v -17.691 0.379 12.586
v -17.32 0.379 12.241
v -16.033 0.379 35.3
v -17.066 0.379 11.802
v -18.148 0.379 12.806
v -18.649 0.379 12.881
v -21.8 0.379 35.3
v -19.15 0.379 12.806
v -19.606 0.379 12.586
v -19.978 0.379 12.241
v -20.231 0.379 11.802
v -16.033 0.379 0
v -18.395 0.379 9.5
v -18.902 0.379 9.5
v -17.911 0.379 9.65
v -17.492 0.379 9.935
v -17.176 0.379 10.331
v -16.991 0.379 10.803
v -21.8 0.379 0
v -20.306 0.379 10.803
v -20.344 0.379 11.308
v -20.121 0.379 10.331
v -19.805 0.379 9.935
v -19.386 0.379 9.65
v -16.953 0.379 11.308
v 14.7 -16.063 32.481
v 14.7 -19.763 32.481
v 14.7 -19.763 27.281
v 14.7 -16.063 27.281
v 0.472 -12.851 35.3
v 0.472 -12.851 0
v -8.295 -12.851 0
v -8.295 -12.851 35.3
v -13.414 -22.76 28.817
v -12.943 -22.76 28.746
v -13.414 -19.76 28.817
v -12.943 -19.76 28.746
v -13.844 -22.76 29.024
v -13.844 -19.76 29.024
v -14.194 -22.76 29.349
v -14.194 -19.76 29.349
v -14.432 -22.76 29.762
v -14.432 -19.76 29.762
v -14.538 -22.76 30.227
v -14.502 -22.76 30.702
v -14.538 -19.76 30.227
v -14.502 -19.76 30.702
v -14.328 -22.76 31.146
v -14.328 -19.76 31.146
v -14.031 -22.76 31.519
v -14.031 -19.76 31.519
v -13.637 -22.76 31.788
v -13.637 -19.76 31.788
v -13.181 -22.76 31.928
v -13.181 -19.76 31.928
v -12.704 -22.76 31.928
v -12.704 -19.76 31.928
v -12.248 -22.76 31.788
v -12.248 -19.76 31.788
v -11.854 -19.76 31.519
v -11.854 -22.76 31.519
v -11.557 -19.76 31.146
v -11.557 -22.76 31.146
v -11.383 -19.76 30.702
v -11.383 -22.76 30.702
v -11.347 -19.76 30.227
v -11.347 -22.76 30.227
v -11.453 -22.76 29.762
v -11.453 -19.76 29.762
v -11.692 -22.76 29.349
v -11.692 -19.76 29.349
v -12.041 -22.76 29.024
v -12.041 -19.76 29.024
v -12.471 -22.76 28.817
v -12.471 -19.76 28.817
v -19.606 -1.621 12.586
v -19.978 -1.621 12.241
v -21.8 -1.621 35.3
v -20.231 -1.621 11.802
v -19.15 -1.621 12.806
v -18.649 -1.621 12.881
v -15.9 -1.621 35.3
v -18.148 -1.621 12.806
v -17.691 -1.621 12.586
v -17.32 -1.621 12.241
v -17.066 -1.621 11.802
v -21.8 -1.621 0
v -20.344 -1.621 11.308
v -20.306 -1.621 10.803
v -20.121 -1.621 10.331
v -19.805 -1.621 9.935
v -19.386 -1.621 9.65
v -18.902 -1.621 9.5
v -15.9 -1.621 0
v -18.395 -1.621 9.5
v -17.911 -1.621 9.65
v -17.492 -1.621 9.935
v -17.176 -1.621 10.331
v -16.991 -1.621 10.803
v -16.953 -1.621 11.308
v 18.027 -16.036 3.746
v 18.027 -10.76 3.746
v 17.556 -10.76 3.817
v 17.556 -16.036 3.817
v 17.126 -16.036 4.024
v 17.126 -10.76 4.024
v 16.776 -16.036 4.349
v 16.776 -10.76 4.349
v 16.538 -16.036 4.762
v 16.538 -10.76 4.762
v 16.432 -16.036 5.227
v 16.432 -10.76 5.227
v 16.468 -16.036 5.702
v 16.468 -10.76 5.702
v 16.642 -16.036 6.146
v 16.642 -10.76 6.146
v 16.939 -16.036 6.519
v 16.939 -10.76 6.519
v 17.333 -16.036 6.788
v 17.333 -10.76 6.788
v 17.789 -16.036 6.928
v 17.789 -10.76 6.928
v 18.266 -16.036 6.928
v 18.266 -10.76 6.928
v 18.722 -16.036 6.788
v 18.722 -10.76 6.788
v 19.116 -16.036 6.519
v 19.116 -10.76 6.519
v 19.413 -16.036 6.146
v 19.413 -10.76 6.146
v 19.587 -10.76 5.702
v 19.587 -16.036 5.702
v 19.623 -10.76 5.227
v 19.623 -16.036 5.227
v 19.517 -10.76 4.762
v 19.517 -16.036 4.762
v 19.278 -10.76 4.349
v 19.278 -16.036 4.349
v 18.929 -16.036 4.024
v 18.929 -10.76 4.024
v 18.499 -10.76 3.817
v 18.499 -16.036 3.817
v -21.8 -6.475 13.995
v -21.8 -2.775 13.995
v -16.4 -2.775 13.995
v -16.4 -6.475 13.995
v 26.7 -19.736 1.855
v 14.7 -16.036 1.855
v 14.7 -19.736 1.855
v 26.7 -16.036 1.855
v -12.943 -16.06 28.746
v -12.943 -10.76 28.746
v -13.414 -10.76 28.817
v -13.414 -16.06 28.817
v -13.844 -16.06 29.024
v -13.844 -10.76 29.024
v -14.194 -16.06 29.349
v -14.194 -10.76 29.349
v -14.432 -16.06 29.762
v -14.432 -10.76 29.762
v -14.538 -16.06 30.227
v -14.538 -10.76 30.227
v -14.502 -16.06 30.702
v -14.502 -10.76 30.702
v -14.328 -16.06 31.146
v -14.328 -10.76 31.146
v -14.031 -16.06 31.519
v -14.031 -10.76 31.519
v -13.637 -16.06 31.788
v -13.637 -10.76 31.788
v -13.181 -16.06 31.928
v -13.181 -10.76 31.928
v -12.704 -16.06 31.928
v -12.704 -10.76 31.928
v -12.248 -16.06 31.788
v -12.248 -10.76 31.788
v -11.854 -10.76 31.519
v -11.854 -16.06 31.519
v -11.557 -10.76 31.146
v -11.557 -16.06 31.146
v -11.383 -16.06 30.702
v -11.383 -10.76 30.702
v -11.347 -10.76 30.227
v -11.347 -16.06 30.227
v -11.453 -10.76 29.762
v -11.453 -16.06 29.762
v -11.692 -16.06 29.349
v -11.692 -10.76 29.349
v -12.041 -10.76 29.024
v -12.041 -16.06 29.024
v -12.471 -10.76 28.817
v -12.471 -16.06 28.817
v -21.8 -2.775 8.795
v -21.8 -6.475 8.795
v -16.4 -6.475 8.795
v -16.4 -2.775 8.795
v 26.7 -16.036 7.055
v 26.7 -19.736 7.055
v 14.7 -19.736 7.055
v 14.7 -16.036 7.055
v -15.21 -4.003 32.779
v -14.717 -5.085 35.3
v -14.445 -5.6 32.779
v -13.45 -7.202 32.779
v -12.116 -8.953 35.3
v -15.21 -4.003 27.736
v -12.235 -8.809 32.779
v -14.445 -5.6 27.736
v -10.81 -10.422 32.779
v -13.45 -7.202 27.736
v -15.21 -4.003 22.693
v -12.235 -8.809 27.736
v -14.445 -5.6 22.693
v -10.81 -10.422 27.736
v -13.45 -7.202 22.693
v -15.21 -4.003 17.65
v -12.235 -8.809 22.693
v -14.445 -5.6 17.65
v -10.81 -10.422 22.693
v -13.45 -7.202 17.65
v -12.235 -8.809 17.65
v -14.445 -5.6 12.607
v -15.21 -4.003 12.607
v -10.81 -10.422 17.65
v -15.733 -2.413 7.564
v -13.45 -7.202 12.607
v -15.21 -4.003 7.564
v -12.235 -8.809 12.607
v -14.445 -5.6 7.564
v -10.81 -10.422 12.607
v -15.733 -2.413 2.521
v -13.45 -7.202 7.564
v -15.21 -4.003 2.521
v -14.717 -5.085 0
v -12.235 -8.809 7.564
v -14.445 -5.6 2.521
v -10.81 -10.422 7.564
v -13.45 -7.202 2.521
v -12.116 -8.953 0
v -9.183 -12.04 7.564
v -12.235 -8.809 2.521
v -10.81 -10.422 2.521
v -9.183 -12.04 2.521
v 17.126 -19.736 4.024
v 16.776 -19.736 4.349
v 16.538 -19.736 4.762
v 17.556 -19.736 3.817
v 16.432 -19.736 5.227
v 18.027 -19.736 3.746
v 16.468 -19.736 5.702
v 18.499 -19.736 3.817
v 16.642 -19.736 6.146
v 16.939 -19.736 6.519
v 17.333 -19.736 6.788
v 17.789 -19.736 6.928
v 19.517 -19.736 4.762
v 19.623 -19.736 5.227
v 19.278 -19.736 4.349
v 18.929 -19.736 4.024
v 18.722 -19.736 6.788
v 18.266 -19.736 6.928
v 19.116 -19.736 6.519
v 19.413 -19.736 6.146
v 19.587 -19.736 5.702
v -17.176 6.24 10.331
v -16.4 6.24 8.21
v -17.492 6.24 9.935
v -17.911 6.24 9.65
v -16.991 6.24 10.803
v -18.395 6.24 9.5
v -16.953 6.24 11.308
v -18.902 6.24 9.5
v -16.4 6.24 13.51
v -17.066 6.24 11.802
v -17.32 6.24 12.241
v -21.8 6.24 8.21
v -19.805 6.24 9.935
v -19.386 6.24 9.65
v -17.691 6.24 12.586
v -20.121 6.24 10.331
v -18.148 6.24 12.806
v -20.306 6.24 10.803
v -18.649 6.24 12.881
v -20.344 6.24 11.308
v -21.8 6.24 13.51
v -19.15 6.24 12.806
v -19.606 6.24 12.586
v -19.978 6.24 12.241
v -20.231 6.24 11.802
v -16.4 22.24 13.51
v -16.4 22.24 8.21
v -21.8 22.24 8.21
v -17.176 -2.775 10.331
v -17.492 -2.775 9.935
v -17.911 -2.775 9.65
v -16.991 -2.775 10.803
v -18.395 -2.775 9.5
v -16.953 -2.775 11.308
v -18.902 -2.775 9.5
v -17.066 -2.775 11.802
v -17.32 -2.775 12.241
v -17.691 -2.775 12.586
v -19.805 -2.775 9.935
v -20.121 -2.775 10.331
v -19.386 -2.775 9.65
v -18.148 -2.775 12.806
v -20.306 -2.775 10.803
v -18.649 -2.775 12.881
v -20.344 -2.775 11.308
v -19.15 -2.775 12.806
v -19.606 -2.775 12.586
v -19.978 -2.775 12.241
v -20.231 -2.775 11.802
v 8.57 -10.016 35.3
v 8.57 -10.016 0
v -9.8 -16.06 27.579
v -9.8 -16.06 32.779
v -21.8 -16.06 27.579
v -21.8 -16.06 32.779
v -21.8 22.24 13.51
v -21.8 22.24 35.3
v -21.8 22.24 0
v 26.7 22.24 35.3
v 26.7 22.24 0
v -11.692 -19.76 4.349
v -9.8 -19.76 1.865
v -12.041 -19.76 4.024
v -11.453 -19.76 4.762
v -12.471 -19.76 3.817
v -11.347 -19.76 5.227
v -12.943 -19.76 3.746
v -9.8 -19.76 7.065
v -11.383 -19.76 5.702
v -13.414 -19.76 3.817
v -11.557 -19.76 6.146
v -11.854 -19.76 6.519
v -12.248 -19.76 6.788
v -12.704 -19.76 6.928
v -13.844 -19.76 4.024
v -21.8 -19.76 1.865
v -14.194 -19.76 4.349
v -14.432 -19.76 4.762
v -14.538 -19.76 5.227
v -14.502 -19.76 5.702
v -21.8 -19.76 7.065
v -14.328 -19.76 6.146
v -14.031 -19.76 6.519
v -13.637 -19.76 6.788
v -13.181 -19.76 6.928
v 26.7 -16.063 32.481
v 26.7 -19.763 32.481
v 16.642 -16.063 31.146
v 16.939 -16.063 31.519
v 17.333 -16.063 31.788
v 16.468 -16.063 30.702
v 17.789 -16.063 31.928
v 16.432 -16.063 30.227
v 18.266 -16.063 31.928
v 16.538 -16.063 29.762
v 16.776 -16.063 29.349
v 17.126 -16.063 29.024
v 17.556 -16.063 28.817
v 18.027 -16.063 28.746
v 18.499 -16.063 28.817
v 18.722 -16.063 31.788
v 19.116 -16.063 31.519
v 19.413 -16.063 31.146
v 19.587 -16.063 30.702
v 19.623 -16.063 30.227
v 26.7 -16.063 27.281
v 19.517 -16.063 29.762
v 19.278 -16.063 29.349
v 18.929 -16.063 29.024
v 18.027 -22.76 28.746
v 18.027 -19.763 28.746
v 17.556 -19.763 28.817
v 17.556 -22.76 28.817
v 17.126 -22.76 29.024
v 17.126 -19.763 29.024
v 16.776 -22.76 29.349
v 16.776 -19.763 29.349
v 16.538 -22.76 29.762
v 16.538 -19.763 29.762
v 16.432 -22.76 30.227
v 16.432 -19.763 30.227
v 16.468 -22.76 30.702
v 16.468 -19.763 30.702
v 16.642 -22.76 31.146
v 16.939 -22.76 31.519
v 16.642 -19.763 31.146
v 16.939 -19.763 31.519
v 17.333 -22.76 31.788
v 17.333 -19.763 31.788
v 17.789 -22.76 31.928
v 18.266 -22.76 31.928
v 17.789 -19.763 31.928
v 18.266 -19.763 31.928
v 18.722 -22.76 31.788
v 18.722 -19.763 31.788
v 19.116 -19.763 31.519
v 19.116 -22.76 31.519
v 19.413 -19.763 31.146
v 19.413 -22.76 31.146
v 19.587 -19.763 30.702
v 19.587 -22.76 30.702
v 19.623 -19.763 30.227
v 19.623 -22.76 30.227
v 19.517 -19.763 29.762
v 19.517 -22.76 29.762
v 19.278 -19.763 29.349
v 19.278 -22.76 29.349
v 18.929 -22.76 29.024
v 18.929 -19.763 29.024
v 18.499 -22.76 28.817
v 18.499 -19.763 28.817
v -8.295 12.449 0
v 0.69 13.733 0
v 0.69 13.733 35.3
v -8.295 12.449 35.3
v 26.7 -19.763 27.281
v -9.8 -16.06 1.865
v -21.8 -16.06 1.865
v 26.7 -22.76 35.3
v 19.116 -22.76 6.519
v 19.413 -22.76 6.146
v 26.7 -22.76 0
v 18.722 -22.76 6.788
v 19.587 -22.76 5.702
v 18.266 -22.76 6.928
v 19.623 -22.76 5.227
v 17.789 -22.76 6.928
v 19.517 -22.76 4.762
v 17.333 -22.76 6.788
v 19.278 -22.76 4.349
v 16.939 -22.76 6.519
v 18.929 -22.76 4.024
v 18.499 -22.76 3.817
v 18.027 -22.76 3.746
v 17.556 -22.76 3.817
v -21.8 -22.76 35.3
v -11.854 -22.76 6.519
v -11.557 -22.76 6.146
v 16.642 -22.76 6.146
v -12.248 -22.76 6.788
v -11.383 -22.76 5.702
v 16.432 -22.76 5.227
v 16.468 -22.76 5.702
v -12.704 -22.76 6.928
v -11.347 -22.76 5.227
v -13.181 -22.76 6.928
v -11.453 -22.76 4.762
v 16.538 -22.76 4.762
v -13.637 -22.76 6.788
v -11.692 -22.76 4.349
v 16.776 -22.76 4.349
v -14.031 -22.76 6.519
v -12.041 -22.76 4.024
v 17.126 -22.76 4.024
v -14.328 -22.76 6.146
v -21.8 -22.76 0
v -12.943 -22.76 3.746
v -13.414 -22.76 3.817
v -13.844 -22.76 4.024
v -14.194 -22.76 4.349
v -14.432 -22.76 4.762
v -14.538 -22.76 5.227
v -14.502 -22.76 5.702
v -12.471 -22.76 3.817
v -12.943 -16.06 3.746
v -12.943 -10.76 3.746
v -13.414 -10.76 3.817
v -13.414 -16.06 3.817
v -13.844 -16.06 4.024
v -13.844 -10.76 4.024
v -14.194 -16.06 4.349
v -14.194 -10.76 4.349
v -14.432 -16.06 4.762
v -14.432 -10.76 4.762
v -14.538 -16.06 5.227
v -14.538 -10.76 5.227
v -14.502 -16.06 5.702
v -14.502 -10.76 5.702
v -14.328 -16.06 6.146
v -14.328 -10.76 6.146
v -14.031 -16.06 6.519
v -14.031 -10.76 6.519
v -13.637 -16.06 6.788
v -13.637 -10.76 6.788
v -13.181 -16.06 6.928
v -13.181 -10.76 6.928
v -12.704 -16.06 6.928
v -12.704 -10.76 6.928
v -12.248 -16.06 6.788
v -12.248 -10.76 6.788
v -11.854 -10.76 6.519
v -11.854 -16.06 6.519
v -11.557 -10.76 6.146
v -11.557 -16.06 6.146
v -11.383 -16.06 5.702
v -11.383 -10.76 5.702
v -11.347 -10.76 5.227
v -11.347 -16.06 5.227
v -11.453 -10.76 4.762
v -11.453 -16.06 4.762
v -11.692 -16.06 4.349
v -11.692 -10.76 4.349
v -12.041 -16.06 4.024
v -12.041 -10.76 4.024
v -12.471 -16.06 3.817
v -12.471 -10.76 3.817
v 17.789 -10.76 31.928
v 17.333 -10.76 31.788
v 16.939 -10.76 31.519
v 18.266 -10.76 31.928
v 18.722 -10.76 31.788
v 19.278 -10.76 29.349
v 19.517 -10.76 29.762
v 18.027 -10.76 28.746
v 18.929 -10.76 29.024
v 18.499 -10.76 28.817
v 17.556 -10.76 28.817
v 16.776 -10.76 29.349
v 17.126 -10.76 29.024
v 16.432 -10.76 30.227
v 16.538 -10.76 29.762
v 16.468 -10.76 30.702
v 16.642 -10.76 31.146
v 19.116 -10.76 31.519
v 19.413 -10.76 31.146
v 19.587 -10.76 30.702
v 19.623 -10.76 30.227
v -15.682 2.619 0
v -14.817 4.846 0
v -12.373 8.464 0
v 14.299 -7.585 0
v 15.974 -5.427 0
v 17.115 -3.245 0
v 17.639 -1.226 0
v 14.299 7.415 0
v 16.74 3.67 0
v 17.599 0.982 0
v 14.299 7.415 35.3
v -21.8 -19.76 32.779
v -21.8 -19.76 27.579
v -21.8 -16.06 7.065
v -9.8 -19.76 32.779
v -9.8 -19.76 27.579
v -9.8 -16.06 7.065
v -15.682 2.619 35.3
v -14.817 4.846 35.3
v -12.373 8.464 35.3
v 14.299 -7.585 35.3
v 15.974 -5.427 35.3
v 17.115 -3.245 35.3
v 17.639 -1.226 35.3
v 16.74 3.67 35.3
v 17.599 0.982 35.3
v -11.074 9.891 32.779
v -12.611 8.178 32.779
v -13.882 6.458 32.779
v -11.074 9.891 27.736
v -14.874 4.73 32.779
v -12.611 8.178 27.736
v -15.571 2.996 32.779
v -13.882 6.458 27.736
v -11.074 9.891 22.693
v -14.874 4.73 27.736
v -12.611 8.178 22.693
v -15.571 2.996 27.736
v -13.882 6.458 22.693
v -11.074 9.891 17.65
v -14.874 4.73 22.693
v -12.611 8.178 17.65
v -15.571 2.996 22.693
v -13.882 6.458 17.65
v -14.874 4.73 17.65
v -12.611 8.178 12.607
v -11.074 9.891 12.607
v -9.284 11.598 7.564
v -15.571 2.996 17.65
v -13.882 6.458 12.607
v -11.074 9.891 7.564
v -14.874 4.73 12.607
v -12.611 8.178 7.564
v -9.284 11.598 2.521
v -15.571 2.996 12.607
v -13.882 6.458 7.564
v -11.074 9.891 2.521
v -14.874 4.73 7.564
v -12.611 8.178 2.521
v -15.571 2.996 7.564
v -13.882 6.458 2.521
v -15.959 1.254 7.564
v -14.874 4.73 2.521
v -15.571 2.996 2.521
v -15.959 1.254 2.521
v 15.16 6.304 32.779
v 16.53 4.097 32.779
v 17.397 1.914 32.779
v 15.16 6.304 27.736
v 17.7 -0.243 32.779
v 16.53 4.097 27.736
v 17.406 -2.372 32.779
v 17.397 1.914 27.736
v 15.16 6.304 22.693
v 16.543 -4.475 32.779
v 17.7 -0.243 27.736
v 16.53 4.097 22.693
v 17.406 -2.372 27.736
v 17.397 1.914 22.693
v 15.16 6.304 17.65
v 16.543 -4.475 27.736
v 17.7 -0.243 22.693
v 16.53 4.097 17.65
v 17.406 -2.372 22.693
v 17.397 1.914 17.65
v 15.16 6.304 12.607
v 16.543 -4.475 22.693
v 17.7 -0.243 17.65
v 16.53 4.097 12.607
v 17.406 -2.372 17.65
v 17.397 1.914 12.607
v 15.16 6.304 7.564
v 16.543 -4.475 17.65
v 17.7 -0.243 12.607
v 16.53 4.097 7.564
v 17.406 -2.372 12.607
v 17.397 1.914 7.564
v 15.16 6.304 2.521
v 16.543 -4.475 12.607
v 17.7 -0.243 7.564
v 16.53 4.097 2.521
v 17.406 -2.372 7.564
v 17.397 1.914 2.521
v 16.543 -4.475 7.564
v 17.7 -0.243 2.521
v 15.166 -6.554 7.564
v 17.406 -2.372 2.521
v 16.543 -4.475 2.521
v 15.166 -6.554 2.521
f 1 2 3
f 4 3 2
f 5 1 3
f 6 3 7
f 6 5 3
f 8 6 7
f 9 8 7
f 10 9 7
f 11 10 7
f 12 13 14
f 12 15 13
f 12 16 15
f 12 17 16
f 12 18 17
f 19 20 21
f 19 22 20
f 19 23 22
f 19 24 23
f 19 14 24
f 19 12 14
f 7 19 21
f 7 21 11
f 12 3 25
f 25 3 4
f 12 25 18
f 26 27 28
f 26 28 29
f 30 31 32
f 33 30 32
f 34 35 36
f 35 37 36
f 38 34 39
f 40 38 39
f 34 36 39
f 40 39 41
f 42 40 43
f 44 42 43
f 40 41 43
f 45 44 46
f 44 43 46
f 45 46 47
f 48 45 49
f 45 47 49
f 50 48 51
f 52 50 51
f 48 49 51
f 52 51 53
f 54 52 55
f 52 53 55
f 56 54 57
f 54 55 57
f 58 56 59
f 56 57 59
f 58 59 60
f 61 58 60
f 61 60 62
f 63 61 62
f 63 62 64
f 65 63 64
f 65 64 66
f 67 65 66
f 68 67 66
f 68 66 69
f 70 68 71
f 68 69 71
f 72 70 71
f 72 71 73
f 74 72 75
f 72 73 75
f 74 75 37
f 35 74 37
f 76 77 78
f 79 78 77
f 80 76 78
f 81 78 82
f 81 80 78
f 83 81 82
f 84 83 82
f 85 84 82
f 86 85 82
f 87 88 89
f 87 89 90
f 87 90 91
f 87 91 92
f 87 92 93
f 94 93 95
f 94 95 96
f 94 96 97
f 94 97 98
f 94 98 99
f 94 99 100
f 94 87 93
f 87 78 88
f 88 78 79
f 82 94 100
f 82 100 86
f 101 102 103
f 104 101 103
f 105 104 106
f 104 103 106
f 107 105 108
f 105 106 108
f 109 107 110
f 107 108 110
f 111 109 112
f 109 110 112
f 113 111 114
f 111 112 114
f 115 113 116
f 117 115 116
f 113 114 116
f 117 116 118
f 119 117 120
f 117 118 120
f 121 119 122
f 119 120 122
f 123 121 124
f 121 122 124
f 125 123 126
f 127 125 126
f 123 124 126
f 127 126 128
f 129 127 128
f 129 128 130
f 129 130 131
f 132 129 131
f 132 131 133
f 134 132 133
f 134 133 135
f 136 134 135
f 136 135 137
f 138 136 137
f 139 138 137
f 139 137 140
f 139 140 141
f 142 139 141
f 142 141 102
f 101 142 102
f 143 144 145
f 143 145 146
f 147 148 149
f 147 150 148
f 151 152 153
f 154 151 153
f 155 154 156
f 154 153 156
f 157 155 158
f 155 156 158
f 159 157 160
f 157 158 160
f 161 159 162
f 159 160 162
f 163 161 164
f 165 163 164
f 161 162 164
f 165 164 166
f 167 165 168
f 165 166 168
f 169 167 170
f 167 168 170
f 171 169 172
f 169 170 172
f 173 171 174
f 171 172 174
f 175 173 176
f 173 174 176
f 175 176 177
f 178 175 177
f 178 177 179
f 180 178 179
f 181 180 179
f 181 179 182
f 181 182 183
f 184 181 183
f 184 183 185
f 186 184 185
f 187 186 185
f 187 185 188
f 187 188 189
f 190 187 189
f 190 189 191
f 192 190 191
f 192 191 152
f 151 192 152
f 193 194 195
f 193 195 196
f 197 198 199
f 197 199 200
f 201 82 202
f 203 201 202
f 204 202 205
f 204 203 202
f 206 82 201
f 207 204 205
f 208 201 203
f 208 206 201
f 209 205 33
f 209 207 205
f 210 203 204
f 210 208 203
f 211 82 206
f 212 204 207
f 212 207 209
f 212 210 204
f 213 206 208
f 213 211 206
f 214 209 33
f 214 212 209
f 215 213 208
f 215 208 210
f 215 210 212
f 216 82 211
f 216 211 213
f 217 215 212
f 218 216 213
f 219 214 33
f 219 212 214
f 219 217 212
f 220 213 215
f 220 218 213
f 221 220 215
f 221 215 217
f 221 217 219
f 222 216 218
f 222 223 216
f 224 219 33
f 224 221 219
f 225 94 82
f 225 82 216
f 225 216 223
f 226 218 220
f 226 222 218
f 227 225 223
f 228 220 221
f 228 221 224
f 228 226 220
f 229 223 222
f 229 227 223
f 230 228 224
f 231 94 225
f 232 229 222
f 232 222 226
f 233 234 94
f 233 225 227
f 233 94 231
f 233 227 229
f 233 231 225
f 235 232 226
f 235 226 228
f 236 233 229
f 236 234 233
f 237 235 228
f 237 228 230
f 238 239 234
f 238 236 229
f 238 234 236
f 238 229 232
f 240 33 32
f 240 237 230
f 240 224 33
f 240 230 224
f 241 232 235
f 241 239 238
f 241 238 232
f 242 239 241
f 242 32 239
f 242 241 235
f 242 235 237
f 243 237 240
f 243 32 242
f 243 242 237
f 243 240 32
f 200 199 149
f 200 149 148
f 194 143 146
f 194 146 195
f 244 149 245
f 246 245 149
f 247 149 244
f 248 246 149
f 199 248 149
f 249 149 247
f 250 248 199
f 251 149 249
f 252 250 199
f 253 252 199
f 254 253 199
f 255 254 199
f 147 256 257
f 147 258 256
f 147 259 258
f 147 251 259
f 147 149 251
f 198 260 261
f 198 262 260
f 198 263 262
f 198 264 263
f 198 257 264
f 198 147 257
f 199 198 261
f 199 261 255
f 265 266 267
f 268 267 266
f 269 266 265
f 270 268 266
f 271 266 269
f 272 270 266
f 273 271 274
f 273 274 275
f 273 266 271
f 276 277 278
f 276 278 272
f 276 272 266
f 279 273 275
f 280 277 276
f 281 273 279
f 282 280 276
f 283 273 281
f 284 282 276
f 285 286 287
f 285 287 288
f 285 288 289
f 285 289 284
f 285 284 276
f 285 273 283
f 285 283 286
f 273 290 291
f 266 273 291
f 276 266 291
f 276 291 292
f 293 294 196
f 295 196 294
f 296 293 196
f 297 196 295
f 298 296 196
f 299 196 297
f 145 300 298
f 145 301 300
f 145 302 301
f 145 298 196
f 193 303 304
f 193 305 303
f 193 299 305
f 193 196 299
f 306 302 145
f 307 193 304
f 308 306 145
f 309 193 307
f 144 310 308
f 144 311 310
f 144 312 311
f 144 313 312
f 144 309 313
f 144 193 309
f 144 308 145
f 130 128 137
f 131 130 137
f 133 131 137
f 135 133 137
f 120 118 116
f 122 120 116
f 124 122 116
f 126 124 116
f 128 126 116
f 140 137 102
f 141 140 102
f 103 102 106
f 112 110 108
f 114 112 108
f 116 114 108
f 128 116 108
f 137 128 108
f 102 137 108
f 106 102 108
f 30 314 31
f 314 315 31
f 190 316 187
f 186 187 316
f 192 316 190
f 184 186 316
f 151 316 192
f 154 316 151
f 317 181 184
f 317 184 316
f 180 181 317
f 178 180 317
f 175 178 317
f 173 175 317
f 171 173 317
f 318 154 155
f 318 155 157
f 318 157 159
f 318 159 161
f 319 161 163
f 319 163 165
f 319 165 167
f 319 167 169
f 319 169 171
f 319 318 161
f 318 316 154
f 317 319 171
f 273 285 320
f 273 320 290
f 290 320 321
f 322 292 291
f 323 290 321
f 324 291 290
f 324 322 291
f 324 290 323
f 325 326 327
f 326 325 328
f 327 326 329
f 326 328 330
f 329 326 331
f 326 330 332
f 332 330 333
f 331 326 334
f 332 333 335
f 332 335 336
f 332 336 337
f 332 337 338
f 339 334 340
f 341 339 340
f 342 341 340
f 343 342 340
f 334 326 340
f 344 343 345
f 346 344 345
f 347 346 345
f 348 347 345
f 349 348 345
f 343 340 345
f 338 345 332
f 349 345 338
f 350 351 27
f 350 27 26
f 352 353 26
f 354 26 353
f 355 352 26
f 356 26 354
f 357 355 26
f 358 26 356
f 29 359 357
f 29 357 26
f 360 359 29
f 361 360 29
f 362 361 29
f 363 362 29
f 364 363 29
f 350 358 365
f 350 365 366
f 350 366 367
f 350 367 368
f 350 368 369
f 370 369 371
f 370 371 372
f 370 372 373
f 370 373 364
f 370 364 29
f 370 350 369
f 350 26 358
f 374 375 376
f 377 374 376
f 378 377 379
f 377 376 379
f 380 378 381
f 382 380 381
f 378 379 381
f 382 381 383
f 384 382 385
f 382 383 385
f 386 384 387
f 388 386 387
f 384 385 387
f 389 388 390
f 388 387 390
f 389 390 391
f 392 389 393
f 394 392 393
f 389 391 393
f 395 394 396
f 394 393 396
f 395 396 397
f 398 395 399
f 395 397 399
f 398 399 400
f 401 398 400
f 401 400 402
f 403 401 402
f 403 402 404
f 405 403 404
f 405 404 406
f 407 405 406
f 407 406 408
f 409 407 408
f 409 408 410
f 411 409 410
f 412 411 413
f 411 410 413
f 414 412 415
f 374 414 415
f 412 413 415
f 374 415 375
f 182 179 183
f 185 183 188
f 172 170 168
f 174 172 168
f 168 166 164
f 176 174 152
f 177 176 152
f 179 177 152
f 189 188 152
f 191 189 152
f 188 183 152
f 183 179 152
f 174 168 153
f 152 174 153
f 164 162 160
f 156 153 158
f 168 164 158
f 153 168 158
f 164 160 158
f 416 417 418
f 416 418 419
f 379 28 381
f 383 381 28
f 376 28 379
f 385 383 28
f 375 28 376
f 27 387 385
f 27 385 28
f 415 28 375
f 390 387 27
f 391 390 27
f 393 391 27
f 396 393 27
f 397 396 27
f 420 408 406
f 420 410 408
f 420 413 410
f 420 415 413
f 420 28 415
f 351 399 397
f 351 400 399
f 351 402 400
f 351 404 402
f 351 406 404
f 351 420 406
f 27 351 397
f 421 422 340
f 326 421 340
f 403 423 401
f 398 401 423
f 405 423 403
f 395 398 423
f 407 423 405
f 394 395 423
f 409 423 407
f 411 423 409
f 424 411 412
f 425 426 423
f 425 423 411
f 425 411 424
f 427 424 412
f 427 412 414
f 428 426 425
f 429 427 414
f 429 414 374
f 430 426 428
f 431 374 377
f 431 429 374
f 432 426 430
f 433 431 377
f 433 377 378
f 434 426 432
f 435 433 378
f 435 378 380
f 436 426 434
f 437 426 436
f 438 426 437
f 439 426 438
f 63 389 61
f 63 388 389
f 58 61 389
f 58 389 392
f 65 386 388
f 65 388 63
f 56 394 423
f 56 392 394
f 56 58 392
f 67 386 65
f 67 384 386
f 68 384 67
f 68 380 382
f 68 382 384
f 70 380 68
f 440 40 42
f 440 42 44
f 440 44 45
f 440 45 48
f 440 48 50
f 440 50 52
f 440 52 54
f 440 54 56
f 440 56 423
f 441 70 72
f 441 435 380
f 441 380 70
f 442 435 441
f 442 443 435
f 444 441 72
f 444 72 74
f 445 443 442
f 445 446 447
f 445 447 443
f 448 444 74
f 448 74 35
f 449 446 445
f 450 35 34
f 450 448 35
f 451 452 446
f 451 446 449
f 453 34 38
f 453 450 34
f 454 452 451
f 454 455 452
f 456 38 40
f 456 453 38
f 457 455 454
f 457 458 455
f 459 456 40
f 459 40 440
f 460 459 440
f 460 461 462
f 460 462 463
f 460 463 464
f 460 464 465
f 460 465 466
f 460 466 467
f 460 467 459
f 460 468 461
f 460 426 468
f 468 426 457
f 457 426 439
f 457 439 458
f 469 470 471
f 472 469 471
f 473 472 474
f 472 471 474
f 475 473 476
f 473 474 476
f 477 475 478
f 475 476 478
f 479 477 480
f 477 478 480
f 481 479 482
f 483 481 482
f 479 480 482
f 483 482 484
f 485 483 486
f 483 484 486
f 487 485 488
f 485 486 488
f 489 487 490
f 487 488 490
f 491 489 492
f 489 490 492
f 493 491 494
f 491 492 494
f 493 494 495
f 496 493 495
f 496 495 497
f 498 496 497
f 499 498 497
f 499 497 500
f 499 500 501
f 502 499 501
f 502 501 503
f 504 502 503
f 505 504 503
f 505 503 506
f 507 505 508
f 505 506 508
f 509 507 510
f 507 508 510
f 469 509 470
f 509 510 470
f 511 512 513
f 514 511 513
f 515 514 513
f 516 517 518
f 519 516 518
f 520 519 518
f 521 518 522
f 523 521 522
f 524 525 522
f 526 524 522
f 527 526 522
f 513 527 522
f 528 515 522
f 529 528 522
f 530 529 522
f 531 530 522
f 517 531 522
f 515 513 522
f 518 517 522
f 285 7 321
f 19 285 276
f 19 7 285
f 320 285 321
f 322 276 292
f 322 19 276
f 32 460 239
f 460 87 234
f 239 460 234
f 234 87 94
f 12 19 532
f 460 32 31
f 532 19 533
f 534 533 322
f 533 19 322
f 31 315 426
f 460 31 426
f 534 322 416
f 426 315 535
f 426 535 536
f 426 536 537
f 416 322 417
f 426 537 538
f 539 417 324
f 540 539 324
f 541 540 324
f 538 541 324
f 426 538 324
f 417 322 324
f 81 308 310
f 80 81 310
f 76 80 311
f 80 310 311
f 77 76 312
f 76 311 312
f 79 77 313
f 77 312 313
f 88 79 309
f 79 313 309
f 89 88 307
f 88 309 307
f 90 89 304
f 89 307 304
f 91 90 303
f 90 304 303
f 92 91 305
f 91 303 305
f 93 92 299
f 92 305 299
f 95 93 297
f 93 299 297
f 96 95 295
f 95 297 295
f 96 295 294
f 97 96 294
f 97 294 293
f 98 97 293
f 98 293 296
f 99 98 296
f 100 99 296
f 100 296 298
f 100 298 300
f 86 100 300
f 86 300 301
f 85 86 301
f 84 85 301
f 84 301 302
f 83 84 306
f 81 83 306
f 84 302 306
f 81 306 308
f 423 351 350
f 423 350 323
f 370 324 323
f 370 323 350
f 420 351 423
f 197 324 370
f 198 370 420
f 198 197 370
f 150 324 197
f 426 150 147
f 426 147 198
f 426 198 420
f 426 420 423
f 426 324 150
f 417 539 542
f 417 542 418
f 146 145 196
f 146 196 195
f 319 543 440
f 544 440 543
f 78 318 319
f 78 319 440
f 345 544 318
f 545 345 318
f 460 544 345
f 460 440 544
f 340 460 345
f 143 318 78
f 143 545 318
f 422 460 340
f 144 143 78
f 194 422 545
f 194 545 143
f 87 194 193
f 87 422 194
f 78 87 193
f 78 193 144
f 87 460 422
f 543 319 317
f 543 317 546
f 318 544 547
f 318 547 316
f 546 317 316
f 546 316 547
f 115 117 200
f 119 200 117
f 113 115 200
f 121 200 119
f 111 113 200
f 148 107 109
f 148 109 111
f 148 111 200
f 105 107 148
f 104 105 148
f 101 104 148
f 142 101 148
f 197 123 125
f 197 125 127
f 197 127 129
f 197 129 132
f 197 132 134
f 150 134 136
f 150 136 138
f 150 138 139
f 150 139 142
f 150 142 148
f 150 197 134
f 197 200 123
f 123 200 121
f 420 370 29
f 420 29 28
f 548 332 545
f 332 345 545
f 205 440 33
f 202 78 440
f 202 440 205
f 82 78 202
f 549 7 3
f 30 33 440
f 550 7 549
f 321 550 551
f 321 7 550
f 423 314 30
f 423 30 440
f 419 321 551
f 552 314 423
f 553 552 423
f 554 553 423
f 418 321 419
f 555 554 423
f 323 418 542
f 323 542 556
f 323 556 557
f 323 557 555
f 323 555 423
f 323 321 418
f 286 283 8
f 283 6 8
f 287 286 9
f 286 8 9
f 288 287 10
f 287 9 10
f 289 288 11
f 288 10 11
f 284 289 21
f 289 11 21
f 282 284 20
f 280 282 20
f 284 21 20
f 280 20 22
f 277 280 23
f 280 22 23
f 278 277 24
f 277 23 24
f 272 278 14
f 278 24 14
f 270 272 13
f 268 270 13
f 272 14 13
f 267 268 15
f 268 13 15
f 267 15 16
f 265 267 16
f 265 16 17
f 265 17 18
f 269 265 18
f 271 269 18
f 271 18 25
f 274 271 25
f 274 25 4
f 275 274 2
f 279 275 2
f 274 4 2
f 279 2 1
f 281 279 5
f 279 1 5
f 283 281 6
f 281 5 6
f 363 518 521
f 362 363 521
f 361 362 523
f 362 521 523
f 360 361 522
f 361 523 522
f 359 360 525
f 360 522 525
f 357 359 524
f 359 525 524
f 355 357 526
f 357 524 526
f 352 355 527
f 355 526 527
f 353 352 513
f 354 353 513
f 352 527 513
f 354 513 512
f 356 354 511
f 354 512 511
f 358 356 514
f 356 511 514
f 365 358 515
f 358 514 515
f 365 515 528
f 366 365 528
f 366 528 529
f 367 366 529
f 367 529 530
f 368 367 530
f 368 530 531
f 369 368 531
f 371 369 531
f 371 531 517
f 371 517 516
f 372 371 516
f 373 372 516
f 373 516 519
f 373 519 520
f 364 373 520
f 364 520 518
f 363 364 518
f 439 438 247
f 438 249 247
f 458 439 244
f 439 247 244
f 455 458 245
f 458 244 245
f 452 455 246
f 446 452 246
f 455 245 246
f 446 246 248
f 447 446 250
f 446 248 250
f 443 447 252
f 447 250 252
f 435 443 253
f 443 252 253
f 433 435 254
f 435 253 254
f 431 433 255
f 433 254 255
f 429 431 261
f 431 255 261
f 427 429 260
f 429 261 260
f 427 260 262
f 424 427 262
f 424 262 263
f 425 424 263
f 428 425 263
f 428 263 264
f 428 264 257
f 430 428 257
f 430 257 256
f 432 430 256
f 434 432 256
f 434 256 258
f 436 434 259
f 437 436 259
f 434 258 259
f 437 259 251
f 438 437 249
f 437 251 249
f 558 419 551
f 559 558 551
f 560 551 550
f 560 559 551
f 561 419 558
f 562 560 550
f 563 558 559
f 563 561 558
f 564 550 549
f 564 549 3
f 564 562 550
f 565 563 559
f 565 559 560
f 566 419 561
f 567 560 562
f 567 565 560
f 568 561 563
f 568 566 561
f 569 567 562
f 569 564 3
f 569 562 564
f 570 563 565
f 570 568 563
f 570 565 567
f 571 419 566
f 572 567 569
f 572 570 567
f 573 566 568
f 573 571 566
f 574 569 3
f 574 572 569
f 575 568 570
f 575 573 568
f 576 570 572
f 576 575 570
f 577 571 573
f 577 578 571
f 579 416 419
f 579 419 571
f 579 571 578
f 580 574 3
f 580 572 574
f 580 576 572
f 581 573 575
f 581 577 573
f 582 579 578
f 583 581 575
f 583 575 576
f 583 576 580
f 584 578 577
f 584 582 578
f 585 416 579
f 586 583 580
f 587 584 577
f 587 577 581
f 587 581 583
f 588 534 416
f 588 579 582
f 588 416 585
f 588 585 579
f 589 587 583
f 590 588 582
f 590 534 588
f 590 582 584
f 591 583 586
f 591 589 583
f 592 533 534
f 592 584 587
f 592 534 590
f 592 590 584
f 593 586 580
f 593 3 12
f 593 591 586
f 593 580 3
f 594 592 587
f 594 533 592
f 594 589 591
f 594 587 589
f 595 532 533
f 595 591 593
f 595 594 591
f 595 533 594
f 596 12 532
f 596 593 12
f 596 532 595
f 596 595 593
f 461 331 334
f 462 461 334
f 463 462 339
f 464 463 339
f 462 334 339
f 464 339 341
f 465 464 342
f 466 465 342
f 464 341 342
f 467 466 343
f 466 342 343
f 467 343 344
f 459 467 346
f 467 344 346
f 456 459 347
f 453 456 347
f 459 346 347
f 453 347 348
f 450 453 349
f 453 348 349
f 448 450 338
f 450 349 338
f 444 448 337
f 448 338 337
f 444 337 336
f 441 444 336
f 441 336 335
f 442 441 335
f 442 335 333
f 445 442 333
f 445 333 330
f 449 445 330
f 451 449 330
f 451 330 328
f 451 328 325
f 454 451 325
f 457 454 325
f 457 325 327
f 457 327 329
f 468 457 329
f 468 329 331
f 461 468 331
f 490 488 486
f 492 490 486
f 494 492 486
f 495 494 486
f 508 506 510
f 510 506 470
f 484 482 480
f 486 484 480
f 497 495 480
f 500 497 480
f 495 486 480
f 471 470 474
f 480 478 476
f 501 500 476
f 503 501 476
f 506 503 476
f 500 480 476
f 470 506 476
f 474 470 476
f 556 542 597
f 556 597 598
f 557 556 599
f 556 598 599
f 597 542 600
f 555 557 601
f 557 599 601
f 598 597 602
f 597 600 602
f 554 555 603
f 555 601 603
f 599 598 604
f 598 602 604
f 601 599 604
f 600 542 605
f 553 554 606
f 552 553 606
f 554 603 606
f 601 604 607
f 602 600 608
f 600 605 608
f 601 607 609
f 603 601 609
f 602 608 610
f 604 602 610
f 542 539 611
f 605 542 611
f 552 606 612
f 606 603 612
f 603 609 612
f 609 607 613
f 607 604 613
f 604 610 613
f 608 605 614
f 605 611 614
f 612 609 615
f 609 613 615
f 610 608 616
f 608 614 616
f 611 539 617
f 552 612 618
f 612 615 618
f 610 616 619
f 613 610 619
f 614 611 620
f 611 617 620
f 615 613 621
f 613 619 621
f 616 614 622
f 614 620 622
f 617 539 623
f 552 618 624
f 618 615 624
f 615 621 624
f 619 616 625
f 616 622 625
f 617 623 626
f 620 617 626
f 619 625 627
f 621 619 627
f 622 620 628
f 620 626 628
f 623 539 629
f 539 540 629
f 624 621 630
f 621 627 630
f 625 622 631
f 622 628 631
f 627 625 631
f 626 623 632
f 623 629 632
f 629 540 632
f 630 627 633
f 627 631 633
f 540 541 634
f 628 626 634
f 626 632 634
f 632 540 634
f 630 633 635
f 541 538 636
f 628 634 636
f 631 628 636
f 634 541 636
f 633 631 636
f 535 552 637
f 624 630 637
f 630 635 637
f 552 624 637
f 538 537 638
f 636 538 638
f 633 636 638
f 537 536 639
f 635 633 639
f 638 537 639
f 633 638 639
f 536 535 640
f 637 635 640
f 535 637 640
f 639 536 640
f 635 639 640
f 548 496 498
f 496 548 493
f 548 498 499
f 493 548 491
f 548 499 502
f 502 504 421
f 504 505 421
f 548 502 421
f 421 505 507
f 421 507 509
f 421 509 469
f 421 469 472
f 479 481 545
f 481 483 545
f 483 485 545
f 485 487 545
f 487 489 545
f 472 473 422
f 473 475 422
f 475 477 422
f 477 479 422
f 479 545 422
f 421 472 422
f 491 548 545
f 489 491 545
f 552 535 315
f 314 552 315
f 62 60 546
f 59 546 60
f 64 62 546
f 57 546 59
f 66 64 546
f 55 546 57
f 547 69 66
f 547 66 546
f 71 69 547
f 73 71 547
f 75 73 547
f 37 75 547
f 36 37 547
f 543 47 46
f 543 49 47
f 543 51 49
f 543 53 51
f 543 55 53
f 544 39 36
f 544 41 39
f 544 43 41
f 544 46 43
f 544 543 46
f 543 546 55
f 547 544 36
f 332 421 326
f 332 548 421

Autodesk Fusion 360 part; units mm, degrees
sketch "Sketch1" plane through (0, 0, 0) normal (0, 0, 1) x (1, 0, 0)
  line L0 (-21.8, 22.2397) -> (26.7, 22.2397)
  line L1 (26.7, 22.2397) -> (26.7, -22.7603)
  line L2 (26.7, -22.7603) -> (-21.8, -22.7603)
  line L3 (-21.8, -22.7603) -> (-21.8, 22.2397)
  spline S0 degree 5 poles (-8.2949, 12.4487) (-8.8839, 11.9576) (-10.0102, 10.9741) (-11.5448, 9.495) (-13.2761, 7.5148) (-14.8799, 5.0253) (-15.8741, 2.5205) (-16.2099, -0.001) (-15.8626, -2.5398) (-14.8614, -5.0951) (-13.2565, -7.6657) (-11.5298, -9.7334) (-10.0015, -11.2901) (-8.8808, -12.3304) (-8.2949, -12.8513) knots 0 0 0 0 0 0 0.1 0.2 0.3 0.4 0.5 0.6 0.7 0.8 0.9 1 1 1 1 1 1
  spline S1 degree 5 poles (14.2993, 7.4153) (14.5562, 7.1034) (15.0477, 6.4806) (15.718, 5.5494) (16.4756, 4.3142) (17.1805, 2.7814) (17.6209, 1.2609) (17.7748, -0.2462) (17.6287, -1.7394) (17.193, -3.2192) (16.4888, -4.6864) (15.7281, -5.8511) (15.0535, -6.7197) (14.5583, -7.2967) (14.2993, -7.5847) knots 0 0 0 0 0 0 0.1 0.2 0.3 0.4 0.5 0.6 0.7 0.8 0.9 1 1 1 1 1 1
  line L4 (-21.8, -1.6206) -> (-14.6097, -1.6206)
  line L5 (-14.6097, -1.6206) -> (-14.6097, 0.3794)
  line L6 (-14.6097, 0.3794) -> (-21.8, 0.3794)
  line L7 (14.2993, 7.4153) -> (0.6904, 13.733)
  line L8 (0.6904, 13.733) -> (-8.2949, 12.4487)
  line L9 (0.4715, -12.8513) -> (-8.2949, -12.8513)
  line L10 (14.2993, -7.5847) -> (8.5702, -10.0161)
  line L11 (8.5702, -10.0161) -> (0.4715, -12.8513)
  point P0 (-16.0393, 0.095)
  point P1 (17.6997, -0.3339)
  dimension "d6" = 48.5
  dimension "d7" = 45
  dimension "d8" = 15
  dimension "d9" = 25.3
  dimension "d11" = 2
extrude "Extrude1" add sketch "Sketch1" along normal blind 35.3 contours L0 L1 L2 L3 S0 S1 L4 L6 L7 L8 L9 L10 L11
sketch "bad_sketch" plane through (0, 0, 0) normal (0, 0, 1) x (1, 0, 0)
  line L0 (24.6924, 6.1679) -> (15.4617, 8.9936)
  line L1 (15.4617, 8.9936) -> (5.166, 12.1454)
  line L2 (5.166, 12.1454) -> (-5.166, 12.8182)
  line L3 (-5.166, 12.8182) -> (-14.9618, 9.182)
  line L4 (-14.9618, 9.182) -> (-20.3307, 2.1177)
  line L5 (-20.3307, 2.1177) -> (-20.3307, -2.686)
  line L6 (-20.3307, -2.686) -> (-14.9618, -8.9968)
  line L7 (-14.9618, -8.9968) -> (-10.0639, -11.3515)
  line L8 (-10.0639, -11.3515) -> (-5.166, -12.4818)
  line L9 (-5.166, -12.4818) -> (5.166, -12.4818)
  line L10 (5.166, -12.4818) -> (10.3139, -11.0689)
  line L11 (10.3139, -11.0689) -> (24.6924, -8.2432)
  line L12 (24.6924, -8.2432) -> (28.2717, -1.8383)
  line L13 (28.2717, -1.8383) -> (28.9264, 0.3007)
  line L14 (28.9264, 0.3007) -> (26.482, 5.6201)
  line L15 (26.482, 5.6201) -> (24.6924, 6.1679)
  line L16 (-28.837, -17.65) -> (19.663, -17.65)
  line L17 (19.663, -17.65) -> (19.663, 27.35)
  line L18 (19.663, 27.35) -> (-28.837, 27.35)
  line L19 (-28.837, 27.35) -> (-28.837, -17.65)
  line L20 (-28.837, -1.4888) -> (-19.0112, -1.4888)
  line L21 (-19.0112, -1.4888) -> (-19.0112, 0.5112)
  line L22 (-19.0112, 0.5112) -> (-28.837, 0.5112)
  line L23 (-28.837, 0.5112) -> (-28.837, -1.4888)
  dimension "d15" = 48.5
  dimension "d16" = 45
  dimension "d17" = 2
sketch "Sketch3" plane through (0, 22.2397, 0) normal (0, 1, 0) x (-1, 0, 0)
  line L0 (-26.7, 0) -> (21.8, 0)
  line L1 (21.8, 0) -> (21.8, 35.3)
  line L2 (21.8, 35.3) -> (-26.7, 35.3)
  line L3 (-26.7, 35.3) -> (-26.7, 0)
  circle A0 centre (18.6487, 11.1813) radius 1.7
  line L4 (21.8, 13.5098) -> (16.4, 13.5098)
  line L5 (16.4, 13.5098) -> (16.4, 8.2098)
  line L6 (16.4, 8.2098) -> (21.8, 8.2098)
  line L7 (21.8, 8.2098) -> (21.8, 13.5098)
  dimension "d23" = 3.4
  dimension "d26" = 5.4
  dimension "d27" = 5.3
hole "Hole1" at (-18.6487, 22.2397, 11.1813) direction (0, -1, 0) diameter 3.4 depth 26 tip angle 180
extrude "Extrude3" cut sketch "Sketch3" against normal blind 16 contours L1 L4 L5 L6 L7
sketch "Sketch4" plane through (0, -22.7603, 0) normal (0, -1, 0) x (1, 0, 0)
  line L0 (-21.8, 0) -> (26.7, 0)
  line L1 (26.7, 0) -> (26.7, 35.3)
  line L2 (26.7, 35.3) -> (-21.8, 35.3)
  line L3 (-21.8, 35.3) -> (-21.8, 0)
  line L4 (18.0274, 30.3462) -> (-12.9426, 30.3462)
  line L5 (18.0274, 30.3462) -> (18.0274, 5.3462)
  line L6 (18.0274, 5.3462) -> (-12.9426, 5.3462)
  circle A0 centre (18.0274, 5.3462) radius 1.6
  circle A1 centre (-12.9426, 5.3462) radius 1.6
  circle A2 centre (18.0274, 30.3462) radius 1.6
  circle A3 centre (-12.9426, 30.3462) radius 1.6
  line L7 (26.7, 14.5722) -> (17.935, 14.5722)
  dimension "d36" = 30.97
  dimension "d38" = 25
  dimension "d40" = 30.97
  dimension "d41" = 3.2
  dimension "d42" = 3.2
  dimension "d43" = 3.2
  dimension "d44" = 3.2
  dimension "d45" = 8.765
hole "Hole2" at (18.0274, -22.7603, 5.3462) at (-12.9426, -22.7603, 5.3462) at (18.0274, -22.7603, 30.3462) at (-12.9426, -22.7603, 30.3462) direction (0, 1, 0) diameter 3.2 depth 12 tip angle 180
sketch "Sketch5" plane through (-21.8, 0, 0) normal (-1, 0, 0) x (0, -1, 0)
  line L0 (1.6206, 0) -> (22.7603, 0)
  line L1 (22.7603, 0) -> (22.7603, 35.3)
  line L2 (22.7603, 35.3) -> (1.6206, 35.3)
  line L3 (1.6206, 35.3) -> (1.6206, 0)
  line L4 (22.7603, 16.2062) -> (19.7603, 16.2062)
  line L5 (19.7603, 7.0647) -> (16.0603, 7.0647)
  line L6 (16.0603, 7.0647) -> (16.0603, 1.8647)
  line L7 (16.0603, 1.8647) -> (19.7603, 1.8647)
  line L8 (19.7603, 1.8647) -> (19.7603, 7.0647)
  line L9 (19.7603, 27.5787) -> (16.0603, 27.5787)
  line L10 (16.0603, 27.5787) -> (16.0603, 32.7787)
  line L11 (16.0603, 32.7787) -> (19.7603, 32.7787)
  line L12 (19.7603, 32.7787) -> (19.7603, 27.5787)
  line L13 (6.4749, 8.7948) -> (2.7749, 8.7948)
  line L14 (2.7749, 8.7948) -> (2.7749, 13.9948)
  line L15 (2.7749, 13.9948) -> (6.4749, 13.9948)
  line L16 (6.4749, 13.9948) -> (6.4749, 8.7948)
  dimension "d55" = 3
  dimension "d56" = 3.7
  dimension "d57" = 5.2
  dimension "d58" = 3.7
  dimension "d59" = 5.2
  dimension "d65" = 3.7
  dimension "d66" = 5.2
extrude "Extrude4" cut sketch "Sketch5" against normal blind 12 contours L9 L10 L11 L12
extrude "Extrude5" cut sketch "Sketch5" against normal blind 12 contours L5 L6 L7 L8
extrude "Extrude6" cut sketch "Sketch5" against normal blind 5.4 contours L13 L14 L15 L16
sketch "Sketch7" plane through (26.7, 0, 0) normal (1, 0, 0) x (0, 1, 0)
  line L0 (-22.7603, 0) -> (22.2397, 0)
  line L1 (22.2397, 0) -> (22.2397, 35.3)
  line L2 (22.2397, 35.3) -> (-22.7603, 35.3)
  line L3 (-22.7603, 35.3) -> (-22.7603, 0)
  line L4 (-19.7634, 32.4808) -> (-16.0634, 32.4808)
  line L5 (-16.0634, 32.4808) -> (-16.0634, 27.2808)
  line L6 (-16.0634, 27.2808) -> (-19.7634, 27.2808)
  line L7 (-19.7634, 27.2808) -> (-19.7634, 32.4808)
  line L8 (-19.7359, 7.0548) -> (-16.0359, 7.0548)
  line L9 (-16.0359, 7.0548) -> (-16.0359, 1.8548)
  line L10 (-16.0359, 1.8548) -> (-19.7359, 1.8548)
  line L11 (-19.7359, 1.8548) -> (-19.7359, 7.0548)
  dimension "d76" = 3.7
  dimension "d77" = 5.2
  dimension "d78" = 3.7
  dimension "d79" = 5.2
extrude "Extrude8" cut sketch "Sketch7" against normal blind 12 contours L4 L5 L6 L7 | L8 L9 L10 L11
equation "syringe_height = 25.3 mm"
equation "syringe_width = 33.6 mm"
equation "height = 45 mm"
equation "width = 48.5 mm"
equation "width4 = 15 mm"
equation "d6 = width"
equation "d7 = height"
equation "d8 = width4"
equation "d9 = syringe_height"
equation "gap_width = 2 mm"
equation "d11 = gap_width"
equation "d12 = holder_depth"
equation "d15 = width"
equation "d16 = height"
equation "d17 = gap_width"
equation "length = 3 mm"
equation "holder_depth = 35.3 mm"
equation "m3_screw_diameter = 3.4 mm"
equation "d23 = m3_screw_diameter"
equation "rect_clearing_width = 5.3 mm"
equation "rect_clearing_length = 5.4 mm"
equation "d26 = rect_clearing_length"
equation "d27 = rect_clearing_width"
equation "d28 = joining_m3_screw_length"
equation "d29 = m3_screw_diameter"
equation "joining_m3_screw_length = 26 mm"
equation "d32 = -rect_clearing_distance"
equation "rect_clearing_distance = 16 mm"
equation "m3_screw_lateral_dis = 30.97 mm"
equation "d36 = m3_screw_lateral_dis"
equation "m3_screw_vertical_dis = 25 mm"
equation "d38 = m3_screw_vertical_dis"
equation "m3_diameter = 3.2 mm"
equation "d40 = m3_screw_lateral_dis"
equation "d41 = m3_diameter"
equation "d42 = m3_diameter"
equation "d43 = m3_diameter"
equation "d44 = m3_diameter"
equation "d46 = m3_screw_depth"
equation "d47 = m3_diameter"
equation "m3_screw_depth = 12 mm"
equation "nut_insert_width = 3.7 mm"
equation "nut_insert_height = 5.2 mm"
equation "screw_nut_distance = 3 mm"
equation "d55 = screw_nut_distance"
equation "d56 = nut_insert_width"
equation "d57 = nut_insert_height"
equation "d58 = nut_insert_width"
equation "d59 = nut_insert_height"
equation "d60 = -m3_screw_depth"
equation "d62 = -m3_screw_depth"
equation "d65 = nut_insert_width"
equation "d66 = nut_insert_height"
equation "d67 = -clamp_nut_depth"
equation "clamp_nut_depth = 5.4 mm"
equation "d76 = nut_insert_width"
equation "d77 = nut_insert_height"
equation "d78 = nut_insert_width"
equation "d79 = nut_insert_height"
equation "d80 = -m3_screw_depth"
